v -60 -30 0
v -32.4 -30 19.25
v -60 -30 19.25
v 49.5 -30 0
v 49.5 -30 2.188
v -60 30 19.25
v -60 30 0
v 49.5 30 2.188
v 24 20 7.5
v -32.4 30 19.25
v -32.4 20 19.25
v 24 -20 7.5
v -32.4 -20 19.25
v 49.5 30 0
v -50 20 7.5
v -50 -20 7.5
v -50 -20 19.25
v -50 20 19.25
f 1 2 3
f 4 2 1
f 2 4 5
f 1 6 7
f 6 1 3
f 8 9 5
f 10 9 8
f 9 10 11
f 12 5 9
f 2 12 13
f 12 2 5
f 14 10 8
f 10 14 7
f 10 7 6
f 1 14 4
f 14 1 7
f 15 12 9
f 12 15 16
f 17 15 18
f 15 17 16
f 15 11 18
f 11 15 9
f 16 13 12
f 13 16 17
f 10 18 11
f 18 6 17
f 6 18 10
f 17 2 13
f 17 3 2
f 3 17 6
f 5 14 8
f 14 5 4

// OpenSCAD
//height
height = 25  ;
//length
length = 120 ;
//width
width= 60 ;


module toto() {
}

$fn = 24;

half_width  = width / 2;

ep_bor = 10;
bottom_cube_length = length - 4 * ep_bor;
bottom_cube_width = width - 2 * ep_bor;
bottom_cube_height = 6; // 3mm in / 3mm outsite
bottom_z = 0;
top_cube_length = length - 4 * ep_bor;
top_cube_width  = width - 2 * ep_bor;
top_cube_height = height;
top_z = height/2 + 7.5;
tip_cut_pos = length/2 - 0.5;
top_tip_pos = height + 0.5;




bloque_porte();

module bloque_porte()
{
 
 
    difference() {
	translate ([-length/2.0, 0, 0])
    	    polyhedron (	
	    		points = [[0, -half_width, height], [0, half_width, height], [0, half_width, 0], [0, -half_width, 0], [length, -half_width, 0], [length, half_width, 0]],
			faces = [[0,3,2], [0,2,1], [3,0,4], [1,2,5], [0,5,4], [0,1,5],  [5,2,4], [4,2,3], ]);

	translate ([-1 * ep_bor, 0, top_z]) 
	     cube ([top_cube_length,
		     top_cube_width,
		     top_cube_height],
		    center=true) ;
	
	translate ([- length/2 + 10, 0, top_tip_pos]) 
	     cube ([length / 2,
		     width+2,
		     height / 2],
		    center=true) ;
	
	translate ([tip_cut_pos, 0, 0]) 
	     cube ([20,
		   width + 1,
		   height],
		  center=true) ;
	
    }	    
}
